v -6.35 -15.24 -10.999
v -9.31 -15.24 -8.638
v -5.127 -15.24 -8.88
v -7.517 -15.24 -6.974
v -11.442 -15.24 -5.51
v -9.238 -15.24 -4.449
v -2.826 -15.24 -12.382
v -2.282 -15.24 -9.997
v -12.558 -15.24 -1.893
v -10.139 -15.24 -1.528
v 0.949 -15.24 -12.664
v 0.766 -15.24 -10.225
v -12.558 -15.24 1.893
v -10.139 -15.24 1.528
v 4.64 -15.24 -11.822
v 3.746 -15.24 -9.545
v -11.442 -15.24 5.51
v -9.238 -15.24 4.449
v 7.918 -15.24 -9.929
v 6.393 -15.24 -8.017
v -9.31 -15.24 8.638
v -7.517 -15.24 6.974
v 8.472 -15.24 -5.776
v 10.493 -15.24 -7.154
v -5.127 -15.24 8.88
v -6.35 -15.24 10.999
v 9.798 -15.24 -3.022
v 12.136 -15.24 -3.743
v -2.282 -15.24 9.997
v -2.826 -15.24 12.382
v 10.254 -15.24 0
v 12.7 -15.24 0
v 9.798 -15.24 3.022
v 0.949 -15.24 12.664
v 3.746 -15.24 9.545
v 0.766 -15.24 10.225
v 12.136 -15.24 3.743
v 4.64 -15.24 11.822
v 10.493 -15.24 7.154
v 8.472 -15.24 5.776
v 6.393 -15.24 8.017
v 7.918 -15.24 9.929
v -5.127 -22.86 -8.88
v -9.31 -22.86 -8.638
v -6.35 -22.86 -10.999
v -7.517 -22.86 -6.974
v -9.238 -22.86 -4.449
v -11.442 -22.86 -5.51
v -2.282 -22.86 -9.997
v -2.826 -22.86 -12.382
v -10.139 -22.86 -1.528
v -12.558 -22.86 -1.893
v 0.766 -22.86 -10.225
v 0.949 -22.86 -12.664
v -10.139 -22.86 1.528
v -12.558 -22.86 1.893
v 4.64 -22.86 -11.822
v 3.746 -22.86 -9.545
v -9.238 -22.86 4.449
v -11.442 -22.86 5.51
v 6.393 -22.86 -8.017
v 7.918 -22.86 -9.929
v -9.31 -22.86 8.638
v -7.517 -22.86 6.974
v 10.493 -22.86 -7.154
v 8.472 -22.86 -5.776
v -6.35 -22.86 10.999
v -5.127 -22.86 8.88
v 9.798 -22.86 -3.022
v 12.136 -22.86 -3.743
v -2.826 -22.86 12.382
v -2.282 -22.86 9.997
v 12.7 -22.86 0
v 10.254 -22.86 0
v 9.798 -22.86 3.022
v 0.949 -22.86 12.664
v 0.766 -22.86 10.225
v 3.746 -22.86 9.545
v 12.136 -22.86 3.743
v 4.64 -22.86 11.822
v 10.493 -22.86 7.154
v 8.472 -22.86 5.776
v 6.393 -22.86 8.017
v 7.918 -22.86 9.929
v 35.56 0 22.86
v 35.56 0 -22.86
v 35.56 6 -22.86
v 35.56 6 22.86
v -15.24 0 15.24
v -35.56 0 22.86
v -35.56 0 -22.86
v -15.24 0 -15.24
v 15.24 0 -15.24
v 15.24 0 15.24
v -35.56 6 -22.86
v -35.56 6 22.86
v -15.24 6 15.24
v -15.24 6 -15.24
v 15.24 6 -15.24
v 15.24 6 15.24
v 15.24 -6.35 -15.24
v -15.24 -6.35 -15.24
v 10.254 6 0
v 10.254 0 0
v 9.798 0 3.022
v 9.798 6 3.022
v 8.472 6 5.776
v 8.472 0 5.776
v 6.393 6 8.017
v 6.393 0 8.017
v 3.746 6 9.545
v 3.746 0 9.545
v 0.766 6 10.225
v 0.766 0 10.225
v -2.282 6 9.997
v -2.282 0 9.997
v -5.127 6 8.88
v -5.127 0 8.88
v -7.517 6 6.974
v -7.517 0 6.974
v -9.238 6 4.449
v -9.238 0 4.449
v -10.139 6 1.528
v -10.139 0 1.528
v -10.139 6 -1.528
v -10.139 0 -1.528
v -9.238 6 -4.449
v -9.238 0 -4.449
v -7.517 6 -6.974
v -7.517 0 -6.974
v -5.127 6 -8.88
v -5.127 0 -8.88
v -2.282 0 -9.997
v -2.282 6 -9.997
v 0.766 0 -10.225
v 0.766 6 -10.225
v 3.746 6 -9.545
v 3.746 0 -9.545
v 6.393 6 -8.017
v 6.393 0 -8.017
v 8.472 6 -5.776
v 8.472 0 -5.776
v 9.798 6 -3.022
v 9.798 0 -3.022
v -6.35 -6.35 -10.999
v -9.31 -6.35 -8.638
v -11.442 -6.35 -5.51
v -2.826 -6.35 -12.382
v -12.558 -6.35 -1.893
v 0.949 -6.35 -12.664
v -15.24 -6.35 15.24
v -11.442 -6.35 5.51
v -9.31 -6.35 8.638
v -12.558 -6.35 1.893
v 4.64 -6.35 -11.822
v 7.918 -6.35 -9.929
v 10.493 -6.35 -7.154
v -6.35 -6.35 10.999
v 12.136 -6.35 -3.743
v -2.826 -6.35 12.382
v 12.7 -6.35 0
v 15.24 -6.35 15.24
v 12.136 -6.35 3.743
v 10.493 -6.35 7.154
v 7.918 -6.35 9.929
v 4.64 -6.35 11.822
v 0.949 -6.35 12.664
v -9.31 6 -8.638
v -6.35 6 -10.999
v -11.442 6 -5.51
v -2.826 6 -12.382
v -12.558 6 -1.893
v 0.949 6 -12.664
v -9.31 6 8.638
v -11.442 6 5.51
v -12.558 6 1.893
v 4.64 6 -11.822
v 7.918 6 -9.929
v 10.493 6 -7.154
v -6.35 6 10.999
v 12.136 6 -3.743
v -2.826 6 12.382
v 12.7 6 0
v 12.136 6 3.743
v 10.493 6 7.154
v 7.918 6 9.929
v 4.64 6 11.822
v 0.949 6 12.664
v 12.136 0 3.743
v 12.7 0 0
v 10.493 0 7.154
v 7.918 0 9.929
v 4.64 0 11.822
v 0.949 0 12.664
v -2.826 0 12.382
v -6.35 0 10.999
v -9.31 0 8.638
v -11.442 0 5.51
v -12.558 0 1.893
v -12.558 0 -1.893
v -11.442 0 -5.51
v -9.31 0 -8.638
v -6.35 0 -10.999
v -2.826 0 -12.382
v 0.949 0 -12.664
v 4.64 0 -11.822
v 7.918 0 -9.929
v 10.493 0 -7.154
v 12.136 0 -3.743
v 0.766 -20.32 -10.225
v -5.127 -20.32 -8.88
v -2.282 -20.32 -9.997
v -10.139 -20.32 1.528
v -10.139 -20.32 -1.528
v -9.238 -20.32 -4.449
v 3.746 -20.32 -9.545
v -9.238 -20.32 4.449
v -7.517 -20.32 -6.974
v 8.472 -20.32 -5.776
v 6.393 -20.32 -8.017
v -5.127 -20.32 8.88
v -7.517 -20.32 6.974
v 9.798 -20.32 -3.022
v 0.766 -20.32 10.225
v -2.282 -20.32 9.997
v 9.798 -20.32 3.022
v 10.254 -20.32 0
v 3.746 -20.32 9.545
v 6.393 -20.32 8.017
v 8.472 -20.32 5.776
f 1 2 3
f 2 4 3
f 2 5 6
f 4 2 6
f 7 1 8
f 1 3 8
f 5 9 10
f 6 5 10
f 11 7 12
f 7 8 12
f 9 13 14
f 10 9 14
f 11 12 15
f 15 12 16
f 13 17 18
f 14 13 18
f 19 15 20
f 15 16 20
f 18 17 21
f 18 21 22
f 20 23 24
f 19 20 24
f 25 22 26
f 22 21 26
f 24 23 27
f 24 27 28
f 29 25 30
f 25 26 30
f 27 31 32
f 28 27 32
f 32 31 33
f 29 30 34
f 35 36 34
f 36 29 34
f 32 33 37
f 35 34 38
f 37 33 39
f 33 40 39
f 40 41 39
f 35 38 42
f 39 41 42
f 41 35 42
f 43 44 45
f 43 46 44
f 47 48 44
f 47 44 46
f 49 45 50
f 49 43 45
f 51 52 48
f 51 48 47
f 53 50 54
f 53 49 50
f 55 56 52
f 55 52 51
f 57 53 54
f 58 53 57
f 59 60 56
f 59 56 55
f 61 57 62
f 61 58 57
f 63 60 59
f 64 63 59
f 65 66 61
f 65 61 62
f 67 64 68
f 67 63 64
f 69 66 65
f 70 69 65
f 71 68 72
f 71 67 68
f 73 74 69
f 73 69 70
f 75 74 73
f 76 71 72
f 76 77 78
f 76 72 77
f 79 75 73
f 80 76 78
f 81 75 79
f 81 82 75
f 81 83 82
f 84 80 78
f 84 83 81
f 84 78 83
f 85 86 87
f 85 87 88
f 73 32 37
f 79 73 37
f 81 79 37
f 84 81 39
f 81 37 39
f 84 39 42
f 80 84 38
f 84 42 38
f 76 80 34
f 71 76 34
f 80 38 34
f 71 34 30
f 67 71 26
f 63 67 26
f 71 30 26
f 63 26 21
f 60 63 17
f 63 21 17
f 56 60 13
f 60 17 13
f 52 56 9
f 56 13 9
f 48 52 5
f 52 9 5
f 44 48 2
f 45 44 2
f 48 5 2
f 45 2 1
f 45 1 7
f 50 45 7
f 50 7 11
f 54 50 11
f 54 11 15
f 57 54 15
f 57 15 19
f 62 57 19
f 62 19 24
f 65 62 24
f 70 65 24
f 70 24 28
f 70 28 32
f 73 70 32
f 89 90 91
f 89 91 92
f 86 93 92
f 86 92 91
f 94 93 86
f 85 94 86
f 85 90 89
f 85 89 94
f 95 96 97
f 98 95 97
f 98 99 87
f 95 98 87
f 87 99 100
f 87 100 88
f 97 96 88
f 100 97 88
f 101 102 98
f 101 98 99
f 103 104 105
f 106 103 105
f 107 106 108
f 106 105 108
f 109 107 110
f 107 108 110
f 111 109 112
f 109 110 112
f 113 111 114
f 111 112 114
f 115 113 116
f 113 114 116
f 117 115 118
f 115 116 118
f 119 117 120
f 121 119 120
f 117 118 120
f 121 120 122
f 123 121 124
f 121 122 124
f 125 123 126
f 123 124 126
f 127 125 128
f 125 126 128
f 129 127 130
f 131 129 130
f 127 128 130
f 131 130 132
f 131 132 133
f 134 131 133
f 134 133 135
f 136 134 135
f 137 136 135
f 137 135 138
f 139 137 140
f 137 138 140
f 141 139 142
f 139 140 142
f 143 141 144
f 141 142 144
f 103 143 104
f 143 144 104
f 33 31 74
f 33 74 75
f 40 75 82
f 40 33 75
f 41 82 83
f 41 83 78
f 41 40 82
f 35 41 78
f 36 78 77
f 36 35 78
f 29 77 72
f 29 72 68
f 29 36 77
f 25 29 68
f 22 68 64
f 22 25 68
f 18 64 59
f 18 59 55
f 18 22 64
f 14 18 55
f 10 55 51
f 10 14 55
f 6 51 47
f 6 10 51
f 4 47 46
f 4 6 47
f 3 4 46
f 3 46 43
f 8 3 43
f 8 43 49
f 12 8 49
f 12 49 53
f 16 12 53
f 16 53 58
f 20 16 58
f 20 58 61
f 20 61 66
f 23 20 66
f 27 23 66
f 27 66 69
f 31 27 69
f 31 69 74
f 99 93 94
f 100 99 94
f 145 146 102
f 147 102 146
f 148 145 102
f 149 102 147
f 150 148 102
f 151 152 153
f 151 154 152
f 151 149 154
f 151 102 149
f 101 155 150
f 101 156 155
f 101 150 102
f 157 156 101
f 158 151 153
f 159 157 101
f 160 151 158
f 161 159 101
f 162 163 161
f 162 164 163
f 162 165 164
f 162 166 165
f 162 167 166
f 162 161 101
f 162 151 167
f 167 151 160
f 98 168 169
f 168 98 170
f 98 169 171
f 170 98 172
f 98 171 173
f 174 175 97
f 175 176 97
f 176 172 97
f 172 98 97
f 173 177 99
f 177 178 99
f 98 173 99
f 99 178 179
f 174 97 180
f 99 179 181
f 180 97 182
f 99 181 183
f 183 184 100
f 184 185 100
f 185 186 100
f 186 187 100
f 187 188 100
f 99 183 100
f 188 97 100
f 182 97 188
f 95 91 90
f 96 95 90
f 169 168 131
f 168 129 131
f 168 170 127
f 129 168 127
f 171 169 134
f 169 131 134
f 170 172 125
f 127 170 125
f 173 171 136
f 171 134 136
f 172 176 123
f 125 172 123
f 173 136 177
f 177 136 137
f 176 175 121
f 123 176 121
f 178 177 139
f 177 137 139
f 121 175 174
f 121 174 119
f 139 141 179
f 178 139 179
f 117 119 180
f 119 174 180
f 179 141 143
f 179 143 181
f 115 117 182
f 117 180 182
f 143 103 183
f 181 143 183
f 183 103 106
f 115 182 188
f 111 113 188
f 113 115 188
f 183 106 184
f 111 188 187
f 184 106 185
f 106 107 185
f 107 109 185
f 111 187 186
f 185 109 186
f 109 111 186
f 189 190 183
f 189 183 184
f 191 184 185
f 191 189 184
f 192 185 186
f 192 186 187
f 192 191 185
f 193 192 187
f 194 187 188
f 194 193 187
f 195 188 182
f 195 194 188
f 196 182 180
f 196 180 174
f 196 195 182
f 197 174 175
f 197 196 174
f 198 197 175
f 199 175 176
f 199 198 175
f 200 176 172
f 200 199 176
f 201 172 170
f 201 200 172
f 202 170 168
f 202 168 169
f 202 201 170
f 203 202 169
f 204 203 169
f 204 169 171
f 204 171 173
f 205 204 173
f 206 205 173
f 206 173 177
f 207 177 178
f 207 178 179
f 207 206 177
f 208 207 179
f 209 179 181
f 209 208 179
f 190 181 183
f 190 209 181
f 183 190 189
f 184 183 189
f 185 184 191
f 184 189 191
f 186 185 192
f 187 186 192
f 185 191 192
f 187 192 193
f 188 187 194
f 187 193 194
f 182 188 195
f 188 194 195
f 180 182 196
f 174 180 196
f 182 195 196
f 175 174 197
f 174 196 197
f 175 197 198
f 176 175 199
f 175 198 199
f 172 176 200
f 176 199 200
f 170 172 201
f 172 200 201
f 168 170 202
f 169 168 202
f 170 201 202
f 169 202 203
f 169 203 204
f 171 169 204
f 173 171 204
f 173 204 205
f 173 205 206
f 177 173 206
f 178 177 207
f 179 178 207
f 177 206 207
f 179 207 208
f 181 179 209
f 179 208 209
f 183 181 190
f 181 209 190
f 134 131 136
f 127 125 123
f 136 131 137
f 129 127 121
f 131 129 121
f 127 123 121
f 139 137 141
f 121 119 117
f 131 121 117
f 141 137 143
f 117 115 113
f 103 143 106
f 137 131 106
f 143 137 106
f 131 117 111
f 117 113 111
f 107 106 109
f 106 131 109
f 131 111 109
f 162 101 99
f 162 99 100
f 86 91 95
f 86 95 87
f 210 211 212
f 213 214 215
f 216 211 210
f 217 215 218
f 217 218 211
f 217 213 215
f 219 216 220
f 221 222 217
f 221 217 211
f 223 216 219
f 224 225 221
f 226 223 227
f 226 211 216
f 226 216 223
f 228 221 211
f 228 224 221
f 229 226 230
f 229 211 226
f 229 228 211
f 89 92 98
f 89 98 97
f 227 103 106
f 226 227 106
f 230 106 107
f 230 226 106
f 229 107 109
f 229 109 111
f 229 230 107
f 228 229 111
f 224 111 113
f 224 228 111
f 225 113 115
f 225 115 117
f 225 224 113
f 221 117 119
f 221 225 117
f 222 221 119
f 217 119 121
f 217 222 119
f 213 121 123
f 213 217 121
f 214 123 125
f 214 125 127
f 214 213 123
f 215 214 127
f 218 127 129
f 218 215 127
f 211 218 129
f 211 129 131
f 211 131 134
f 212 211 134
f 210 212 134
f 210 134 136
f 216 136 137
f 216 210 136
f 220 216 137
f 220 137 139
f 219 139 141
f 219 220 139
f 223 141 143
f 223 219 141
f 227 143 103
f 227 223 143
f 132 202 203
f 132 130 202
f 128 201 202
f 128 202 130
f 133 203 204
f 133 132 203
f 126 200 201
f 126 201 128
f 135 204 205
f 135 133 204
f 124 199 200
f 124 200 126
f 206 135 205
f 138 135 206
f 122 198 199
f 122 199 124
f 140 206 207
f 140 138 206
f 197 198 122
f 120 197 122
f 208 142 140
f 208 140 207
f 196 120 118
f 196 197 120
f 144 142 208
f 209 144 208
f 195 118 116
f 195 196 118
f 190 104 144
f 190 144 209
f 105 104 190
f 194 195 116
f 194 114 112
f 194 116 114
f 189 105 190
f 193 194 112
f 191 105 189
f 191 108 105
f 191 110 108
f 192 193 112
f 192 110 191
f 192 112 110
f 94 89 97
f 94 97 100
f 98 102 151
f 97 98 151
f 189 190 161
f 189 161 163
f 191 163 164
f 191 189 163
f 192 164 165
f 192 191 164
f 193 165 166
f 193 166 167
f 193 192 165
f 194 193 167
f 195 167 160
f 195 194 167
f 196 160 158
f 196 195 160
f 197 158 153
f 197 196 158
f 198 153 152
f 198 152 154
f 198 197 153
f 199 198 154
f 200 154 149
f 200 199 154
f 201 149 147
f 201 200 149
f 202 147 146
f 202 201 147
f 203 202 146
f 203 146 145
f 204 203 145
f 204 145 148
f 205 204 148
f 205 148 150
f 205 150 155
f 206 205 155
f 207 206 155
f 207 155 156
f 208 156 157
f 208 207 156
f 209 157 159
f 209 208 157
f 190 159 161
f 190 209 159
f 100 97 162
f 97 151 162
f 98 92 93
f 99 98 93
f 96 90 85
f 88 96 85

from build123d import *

# Parameters (mm, degrees)
F0_W          = 71.12
F0_H          = 45.72
F0_W_2        = 30.48
F0_H_2        = 30.48
F1_DEPTH      = 6
F0_R          = 12.7
F2_DEPTH      = 6.35
F2_DEPTH_BACK = 6
F0_R_2        = 10.2539326669
F0_R_3        = 6.985
F3_DEPTH      = 20.32
F3_DEPTH_BACK = 6
F4_DEPTH      = 15.24
F5_DEPTH      = 22.86
F6_DEPTH      = 15.24
F7_DEPTH      = 6


with BuildPart() as f1:
    # F0 (on Front) → F1 (new body)
    with BuildSketch(Plane.XZ):
        Rectangle(F0_W, F0_H)
        Rectangle(F0_W_2, F0_H_2, mode=Mode.SUBTRACT)
    extrude(amount=-F1_DEPTH)

    # F0 (on Front) → F4 (cut)
    with BuildSketch(Plane.XZ):
        Circle(F0_R)
        Circle(F0_R_2, mode=Mode.SUBTRACT)
    extrude(amount=F4_DEPTH, mode=Mode.SUBTRACT)


with BuildPart() as f2:
    # F0 (on Front) → F2 (new body, two sides)
    with BuildSketch(Plane.XZ) as f2_sk:
        Rectangle(F0_W_2, F0_H_2)
        Circle(F0_R, mode=Mode.SUBTRACT)
    extrude(amount=F2_DEPTH)
    extrude(f2_sk.sketch, amount=-F2_DEPTH_BACK)


with BuildPart() as f3:
    # F0 (on Front) → F3 (new body, two sides)
    with BuildSketch(Plane.XZ) as f3_sk:
        Circle(F0_R_2)
        Circle(F0_R_3, mode=Mode.SUBTRACT)
        Circle(F0_R_3)
    extrude(amount=F3_DEPTH)
    extrude(f3_sk.sketch, amount=-F3_DEPTH_BACK)


with BuildPart() as f5:
    # F0 (on Front) → F5 (new body)
    with BuildSketch(Plane.XZ):
        Circle(F0_R)
        Circle(F0_R_2, mode=Mode.SUBTRACT)
    extrude(amount=F5_DEPTH)

    # F0 (on Front) → F6 (cut)
    with BuildSketch(Plane.XZ):
        Circle(F0_R)
        Circle(F0_R_2, mode=Mode.SUBTRACT)
    extrude(amount=F6_DEPTH, mode=Mode.SUBTRACT)


with BuildPart() as f7:
    # F0 (on Front) → F7 (new body, through all)
    with BuildSketch(Plane.XZ):
        Circle(F0_R)
        Circle(F0_R_2, mode=Mode.SUBTRACT)
    extrude(amount=-F7_DEPTH)


solid = Compound([f1.part, f2.part, f3.part, f5.part, f7.part])
